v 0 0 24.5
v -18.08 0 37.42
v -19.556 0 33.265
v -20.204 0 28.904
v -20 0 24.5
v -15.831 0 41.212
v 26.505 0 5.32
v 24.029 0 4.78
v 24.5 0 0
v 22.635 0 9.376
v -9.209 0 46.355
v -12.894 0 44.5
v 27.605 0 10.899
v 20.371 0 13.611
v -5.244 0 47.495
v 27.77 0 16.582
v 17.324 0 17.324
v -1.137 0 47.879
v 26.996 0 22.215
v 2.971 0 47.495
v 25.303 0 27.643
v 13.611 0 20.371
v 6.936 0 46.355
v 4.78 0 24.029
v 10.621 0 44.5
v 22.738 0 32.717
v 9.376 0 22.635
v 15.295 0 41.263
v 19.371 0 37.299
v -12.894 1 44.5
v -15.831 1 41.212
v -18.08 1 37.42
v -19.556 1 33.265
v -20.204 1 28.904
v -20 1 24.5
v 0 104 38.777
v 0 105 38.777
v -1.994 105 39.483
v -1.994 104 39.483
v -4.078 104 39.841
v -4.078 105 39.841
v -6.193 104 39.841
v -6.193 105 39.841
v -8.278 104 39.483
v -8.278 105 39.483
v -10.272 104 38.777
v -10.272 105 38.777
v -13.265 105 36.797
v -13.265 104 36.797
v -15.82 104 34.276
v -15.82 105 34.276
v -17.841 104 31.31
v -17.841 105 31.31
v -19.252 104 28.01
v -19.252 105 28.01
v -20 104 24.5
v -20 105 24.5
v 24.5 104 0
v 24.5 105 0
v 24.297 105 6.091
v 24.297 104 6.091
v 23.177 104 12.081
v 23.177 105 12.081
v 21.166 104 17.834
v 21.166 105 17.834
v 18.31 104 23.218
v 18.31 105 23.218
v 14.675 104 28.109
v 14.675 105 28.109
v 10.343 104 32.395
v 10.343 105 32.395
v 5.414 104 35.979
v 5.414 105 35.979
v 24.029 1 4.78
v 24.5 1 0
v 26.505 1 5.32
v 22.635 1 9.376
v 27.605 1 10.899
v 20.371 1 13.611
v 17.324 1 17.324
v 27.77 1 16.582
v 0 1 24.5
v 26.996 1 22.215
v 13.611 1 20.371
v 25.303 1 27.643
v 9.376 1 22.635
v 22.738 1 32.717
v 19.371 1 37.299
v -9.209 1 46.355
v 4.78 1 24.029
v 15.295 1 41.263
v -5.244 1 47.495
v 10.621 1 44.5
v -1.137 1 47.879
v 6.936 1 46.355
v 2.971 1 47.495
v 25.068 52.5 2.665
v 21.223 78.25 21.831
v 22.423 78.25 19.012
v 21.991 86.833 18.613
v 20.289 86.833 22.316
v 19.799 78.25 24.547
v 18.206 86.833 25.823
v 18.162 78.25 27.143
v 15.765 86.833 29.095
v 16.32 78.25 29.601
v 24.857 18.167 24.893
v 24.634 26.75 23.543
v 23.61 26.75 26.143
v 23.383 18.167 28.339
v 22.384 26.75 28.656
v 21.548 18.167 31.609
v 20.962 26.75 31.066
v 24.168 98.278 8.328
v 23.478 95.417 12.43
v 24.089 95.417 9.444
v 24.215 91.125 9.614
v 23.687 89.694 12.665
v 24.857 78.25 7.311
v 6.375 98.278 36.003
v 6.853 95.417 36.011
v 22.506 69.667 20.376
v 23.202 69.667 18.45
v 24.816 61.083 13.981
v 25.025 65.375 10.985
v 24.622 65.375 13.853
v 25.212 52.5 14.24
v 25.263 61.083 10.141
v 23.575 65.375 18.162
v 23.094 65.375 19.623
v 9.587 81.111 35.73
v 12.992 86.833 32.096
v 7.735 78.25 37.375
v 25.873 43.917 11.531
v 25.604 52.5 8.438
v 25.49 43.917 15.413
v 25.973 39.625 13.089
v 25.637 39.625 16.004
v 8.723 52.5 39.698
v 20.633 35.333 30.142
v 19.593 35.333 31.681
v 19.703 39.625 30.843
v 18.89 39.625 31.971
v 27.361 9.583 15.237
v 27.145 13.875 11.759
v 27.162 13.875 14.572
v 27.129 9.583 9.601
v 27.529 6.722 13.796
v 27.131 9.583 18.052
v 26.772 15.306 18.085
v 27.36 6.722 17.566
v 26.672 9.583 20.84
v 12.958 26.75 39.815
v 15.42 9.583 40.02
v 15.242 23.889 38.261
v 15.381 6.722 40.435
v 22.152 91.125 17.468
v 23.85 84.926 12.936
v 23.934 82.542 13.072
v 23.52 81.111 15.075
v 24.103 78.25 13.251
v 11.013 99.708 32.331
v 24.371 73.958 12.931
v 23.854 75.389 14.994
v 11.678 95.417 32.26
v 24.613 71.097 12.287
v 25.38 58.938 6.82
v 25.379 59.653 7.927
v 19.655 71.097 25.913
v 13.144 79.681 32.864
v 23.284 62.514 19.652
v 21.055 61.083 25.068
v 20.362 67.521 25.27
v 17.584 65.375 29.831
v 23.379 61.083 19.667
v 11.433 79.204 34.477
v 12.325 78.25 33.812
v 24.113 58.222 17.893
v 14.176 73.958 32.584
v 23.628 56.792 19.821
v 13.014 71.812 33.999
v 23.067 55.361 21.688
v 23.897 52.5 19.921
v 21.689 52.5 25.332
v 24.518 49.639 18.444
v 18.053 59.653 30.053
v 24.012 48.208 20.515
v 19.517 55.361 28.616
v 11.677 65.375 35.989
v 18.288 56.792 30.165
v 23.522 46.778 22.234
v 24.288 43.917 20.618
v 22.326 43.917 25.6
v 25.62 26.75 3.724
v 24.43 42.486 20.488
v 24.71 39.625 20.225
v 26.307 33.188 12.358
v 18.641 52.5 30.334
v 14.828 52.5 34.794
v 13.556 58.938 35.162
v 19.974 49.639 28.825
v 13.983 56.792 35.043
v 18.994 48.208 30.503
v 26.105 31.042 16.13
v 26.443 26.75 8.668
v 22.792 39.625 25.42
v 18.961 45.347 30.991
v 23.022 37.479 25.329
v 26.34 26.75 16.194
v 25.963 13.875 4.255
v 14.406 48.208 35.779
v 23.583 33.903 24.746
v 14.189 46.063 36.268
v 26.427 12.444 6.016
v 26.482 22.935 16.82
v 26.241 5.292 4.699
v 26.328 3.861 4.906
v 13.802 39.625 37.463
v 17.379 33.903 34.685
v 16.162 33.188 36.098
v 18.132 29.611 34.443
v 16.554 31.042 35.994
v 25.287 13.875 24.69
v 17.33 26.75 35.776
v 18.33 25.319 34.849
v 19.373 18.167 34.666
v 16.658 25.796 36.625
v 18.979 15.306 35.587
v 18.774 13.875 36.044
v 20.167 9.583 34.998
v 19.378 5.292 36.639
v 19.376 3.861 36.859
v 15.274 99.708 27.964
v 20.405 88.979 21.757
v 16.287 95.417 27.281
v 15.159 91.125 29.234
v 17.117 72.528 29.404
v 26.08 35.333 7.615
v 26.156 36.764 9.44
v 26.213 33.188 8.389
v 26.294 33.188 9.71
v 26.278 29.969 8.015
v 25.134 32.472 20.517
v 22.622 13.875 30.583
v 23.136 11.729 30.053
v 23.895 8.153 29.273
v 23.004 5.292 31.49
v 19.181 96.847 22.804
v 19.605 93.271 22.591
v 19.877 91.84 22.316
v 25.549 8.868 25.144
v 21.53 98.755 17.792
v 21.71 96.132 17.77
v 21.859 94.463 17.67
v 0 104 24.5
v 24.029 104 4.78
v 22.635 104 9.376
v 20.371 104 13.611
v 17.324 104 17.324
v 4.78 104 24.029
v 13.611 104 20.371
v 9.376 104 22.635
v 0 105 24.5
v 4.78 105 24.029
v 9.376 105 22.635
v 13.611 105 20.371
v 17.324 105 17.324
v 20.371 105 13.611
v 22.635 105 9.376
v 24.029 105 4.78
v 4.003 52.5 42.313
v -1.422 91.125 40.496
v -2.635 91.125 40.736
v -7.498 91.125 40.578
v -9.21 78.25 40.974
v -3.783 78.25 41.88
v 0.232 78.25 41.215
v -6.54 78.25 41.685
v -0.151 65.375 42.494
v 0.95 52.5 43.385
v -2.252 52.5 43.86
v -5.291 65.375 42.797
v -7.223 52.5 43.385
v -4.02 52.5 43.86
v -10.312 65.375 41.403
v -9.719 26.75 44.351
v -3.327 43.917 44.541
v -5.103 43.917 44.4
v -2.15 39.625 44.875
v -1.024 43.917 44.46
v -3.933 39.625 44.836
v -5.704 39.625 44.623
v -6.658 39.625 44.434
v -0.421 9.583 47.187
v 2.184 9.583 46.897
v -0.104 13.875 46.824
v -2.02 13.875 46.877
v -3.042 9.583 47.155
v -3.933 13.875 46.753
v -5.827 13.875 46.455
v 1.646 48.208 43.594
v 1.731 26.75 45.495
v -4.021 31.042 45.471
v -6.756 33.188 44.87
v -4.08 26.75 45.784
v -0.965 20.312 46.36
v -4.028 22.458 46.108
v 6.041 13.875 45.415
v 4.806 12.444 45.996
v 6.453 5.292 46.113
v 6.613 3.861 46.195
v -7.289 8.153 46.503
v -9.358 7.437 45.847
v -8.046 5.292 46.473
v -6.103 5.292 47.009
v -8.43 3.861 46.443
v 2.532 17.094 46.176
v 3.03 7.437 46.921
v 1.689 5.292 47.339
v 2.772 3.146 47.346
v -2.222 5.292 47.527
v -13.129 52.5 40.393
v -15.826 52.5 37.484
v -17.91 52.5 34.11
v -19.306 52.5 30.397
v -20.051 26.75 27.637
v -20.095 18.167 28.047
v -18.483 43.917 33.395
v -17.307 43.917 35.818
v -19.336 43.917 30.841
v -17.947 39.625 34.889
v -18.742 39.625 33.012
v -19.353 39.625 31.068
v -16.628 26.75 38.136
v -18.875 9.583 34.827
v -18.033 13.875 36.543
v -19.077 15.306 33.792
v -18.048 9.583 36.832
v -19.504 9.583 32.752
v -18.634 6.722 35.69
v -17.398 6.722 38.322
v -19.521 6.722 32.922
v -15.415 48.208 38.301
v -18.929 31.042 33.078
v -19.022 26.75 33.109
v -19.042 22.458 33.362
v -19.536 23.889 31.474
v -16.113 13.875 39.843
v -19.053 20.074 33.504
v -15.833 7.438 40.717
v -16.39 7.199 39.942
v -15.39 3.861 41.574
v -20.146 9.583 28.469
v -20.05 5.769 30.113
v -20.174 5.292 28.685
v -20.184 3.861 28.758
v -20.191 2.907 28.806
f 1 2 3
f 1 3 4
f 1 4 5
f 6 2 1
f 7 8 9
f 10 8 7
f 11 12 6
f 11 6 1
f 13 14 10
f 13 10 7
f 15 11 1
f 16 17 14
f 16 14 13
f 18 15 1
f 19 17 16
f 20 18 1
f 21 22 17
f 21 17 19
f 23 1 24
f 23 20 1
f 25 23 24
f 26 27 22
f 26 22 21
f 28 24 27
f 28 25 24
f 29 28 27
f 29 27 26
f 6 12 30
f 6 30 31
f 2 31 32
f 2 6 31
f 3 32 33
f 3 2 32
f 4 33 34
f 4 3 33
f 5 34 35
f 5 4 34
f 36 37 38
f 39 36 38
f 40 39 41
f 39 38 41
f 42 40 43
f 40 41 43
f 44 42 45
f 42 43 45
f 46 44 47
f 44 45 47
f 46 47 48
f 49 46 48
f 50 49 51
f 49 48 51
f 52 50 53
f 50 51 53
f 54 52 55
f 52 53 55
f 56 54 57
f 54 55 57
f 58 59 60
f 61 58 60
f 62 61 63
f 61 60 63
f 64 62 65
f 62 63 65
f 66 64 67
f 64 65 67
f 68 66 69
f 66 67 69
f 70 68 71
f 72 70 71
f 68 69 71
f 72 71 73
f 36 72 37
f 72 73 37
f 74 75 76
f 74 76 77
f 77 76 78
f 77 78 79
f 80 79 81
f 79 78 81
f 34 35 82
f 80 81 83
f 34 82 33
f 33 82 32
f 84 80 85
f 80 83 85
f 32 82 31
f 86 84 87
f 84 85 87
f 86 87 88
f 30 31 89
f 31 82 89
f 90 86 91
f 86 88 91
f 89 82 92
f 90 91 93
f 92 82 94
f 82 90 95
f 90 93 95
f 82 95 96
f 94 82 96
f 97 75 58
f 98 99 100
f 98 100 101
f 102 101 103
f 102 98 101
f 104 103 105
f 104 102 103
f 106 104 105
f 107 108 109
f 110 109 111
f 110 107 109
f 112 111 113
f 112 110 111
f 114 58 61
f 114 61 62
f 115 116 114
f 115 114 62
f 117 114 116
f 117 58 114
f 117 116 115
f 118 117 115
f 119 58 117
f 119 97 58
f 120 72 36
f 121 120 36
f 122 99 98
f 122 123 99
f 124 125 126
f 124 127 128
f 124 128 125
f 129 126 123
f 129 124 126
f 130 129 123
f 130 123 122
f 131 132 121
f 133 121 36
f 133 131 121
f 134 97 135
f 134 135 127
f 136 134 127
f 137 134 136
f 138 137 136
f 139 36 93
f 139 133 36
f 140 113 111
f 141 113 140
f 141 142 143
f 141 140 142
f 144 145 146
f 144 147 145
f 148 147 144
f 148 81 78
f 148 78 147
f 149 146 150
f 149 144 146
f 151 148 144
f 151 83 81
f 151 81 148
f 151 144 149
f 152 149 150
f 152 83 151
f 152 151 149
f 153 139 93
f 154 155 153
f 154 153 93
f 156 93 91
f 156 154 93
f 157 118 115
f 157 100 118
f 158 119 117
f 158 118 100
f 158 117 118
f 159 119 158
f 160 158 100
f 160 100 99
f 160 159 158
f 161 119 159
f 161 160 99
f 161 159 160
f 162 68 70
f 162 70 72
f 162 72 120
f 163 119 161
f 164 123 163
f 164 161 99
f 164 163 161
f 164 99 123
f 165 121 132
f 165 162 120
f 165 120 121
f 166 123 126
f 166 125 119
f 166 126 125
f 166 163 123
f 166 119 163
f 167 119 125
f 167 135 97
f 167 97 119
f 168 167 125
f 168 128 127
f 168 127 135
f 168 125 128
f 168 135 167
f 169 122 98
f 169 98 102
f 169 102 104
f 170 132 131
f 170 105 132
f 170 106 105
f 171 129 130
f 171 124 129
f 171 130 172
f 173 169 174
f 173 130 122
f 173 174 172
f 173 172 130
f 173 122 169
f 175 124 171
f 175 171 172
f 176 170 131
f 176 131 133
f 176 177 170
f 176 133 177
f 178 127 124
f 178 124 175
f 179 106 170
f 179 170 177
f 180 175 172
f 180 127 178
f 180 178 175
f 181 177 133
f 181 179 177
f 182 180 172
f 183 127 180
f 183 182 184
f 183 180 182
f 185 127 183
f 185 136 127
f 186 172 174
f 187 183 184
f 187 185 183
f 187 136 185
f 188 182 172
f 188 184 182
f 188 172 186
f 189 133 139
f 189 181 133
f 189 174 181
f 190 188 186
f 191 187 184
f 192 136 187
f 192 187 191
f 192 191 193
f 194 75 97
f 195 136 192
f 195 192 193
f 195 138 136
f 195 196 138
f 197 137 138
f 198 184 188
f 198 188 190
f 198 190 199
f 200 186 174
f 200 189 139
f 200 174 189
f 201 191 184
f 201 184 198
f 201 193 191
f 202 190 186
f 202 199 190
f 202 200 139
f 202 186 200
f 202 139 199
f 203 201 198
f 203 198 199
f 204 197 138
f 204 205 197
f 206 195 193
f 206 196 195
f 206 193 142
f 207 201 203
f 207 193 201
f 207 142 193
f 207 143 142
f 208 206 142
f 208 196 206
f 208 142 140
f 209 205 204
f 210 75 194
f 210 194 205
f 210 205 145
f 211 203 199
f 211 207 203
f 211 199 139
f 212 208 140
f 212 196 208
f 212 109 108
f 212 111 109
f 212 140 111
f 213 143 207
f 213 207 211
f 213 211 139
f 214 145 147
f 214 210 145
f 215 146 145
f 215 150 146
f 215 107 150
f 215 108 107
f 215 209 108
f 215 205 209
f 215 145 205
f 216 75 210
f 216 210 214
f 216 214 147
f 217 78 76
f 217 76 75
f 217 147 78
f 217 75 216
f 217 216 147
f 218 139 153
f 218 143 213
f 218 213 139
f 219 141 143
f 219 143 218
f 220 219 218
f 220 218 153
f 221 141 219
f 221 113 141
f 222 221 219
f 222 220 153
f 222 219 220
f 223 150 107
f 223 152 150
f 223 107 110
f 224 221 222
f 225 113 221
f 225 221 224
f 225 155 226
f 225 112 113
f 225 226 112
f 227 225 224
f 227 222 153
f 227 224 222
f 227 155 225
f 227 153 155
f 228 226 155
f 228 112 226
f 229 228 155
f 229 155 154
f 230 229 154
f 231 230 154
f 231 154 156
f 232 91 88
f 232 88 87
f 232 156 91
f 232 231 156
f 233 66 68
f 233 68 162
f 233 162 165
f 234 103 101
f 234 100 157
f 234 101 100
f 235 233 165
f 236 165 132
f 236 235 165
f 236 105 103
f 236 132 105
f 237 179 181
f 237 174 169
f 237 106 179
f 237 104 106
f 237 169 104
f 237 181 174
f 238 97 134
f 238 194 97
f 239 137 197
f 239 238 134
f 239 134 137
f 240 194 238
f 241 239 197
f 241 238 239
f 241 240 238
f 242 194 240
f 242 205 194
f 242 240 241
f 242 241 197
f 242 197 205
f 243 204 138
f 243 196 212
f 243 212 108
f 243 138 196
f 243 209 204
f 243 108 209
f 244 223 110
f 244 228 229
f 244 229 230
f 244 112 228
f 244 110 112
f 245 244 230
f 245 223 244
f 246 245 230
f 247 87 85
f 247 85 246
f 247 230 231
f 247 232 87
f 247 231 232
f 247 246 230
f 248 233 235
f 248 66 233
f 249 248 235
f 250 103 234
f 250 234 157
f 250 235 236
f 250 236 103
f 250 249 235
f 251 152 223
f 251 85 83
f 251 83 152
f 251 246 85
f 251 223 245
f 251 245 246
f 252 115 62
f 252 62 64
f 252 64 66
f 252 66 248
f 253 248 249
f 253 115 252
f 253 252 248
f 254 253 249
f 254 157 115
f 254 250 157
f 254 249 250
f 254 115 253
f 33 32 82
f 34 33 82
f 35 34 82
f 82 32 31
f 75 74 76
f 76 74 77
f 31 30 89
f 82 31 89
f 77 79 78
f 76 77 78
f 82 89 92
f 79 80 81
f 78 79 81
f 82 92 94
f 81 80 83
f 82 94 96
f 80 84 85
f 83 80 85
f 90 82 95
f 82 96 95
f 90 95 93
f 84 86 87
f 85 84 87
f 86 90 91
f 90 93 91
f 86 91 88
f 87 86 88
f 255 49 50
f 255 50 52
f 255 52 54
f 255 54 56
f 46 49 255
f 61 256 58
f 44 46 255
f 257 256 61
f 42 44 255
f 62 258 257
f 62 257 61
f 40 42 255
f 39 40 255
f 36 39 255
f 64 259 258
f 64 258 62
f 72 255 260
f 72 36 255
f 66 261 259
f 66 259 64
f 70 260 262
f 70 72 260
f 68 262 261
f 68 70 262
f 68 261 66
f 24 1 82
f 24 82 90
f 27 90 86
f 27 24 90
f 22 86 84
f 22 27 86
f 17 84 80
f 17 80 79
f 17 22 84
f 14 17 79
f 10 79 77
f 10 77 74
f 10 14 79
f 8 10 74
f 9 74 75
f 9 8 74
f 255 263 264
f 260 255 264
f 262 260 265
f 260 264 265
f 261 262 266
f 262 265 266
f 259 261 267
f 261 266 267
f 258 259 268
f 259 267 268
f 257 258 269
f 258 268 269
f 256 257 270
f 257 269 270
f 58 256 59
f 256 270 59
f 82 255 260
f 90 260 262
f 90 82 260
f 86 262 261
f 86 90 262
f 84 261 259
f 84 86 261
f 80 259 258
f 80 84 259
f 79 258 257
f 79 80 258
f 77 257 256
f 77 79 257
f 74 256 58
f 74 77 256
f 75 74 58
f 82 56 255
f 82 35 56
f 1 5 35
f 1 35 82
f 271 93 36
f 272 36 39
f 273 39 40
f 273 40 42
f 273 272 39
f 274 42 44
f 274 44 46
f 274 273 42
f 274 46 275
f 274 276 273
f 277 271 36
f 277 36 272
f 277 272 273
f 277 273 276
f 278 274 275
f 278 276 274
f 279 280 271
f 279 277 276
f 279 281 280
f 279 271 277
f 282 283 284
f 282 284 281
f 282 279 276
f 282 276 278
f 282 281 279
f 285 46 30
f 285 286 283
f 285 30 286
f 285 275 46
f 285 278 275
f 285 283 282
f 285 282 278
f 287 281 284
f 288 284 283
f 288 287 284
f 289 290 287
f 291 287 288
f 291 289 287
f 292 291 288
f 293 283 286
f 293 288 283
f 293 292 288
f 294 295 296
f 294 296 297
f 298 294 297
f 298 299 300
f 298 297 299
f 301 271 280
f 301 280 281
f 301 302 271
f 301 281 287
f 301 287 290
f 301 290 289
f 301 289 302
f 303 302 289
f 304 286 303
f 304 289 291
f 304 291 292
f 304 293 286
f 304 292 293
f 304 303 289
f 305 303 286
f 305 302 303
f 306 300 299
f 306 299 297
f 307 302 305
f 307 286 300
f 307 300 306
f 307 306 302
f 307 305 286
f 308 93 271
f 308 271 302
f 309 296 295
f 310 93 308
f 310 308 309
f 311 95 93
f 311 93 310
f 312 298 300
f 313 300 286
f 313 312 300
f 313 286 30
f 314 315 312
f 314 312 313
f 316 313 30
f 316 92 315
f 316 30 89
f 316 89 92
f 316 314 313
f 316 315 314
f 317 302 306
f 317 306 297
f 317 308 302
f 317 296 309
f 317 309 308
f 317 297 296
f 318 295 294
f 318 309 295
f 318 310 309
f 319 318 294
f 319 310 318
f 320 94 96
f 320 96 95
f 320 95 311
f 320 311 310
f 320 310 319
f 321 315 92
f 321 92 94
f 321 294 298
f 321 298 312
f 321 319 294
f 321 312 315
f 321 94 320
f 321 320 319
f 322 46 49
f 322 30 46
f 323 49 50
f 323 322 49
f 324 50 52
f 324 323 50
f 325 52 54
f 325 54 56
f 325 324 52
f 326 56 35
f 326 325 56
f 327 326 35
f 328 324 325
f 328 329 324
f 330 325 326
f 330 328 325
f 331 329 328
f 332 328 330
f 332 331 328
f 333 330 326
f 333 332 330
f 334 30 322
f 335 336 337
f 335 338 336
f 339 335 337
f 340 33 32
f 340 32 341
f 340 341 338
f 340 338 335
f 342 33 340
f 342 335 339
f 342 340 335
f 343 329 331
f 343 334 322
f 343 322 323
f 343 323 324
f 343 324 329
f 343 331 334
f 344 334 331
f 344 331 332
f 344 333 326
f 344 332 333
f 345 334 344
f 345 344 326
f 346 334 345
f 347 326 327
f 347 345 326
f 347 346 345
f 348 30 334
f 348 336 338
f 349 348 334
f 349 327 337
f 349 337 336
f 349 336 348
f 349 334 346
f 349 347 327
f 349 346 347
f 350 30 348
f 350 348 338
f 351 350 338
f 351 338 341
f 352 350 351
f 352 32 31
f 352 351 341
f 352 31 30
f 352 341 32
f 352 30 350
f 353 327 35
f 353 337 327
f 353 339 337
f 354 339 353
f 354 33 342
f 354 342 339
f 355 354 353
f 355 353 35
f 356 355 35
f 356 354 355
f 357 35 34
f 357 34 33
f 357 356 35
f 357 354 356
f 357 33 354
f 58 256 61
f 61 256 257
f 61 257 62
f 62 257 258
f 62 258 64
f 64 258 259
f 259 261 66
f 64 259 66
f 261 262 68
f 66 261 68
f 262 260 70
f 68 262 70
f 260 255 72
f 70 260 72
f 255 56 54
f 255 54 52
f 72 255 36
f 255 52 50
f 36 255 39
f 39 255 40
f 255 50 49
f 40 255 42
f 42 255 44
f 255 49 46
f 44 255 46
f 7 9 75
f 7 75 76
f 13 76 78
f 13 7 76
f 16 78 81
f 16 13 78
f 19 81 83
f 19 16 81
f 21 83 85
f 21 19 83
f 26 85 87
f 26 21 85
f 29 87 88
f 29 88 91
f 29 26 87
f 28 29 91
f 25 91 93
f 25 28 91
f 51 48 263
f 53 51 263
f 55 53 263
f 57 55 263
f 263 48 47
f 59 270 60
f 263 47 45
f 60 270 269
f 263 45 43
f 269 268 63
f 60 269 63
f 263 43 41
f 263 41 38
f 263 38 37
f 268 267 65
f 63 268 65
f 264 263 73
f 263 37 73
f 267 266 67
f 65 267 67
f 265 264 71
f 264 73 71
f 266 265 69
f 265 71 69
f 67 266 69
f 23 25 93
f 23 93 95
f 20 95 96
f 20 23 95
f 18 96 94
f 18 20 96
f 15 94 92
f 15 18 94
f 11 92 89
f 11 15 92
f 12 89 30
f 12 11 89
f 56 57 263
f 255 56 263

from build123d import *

# Parameters (mm, degrees)
F3_DEPTH = 1
F4_DEPTH = 1


with BuildPart() as f3:
    # F0 (on Front) → F3 (new body)
    with BuildSketch(Plane.XZ):
        with BuildLine():
            ThreePointArc((0, 24.5), (17.324116, 17.324116), (24.5, 0))
            ThreePointArc((24.5, 0), (26.262022, 24.963942), (10.620872, 44.5))
            ThreePointArc((10.620872, 44.5), (-1.136736, 47.879267), (-12.894344, 44.5))
            ThreePointArc((-12.894344, 44.5), (-18.918747, 35.378108), (-20, 24.5))
            Line((-20, 24.5), (-12.894344, 24.5))
            Line((-12.894344, 24.5), (0, 24.5))
        make_face()
    extrude(amount=-F3_DEPTH)


with BuildPart() as f4:
    # F2 (on offset) → F4 (new body)
    with BuildSketch(Plane.XZ.offset(-105)):
        with BuildLine():
            Line((-20, 24.5), (0, 24.5))
            ThreePointArc((0, 24.5), (17.324116, 17.324116), (24.5, 0))
            ThreePointArc((24.5, 0), (18.310327, 23.217635), (0, 38.777281))
            ThreePointArc((0, 38.777281), (-5.135931, 39.886059), (-10.271862, 38.777281))
            ThreePointArc((-10.271862, 38.777281), (-16.902065, 32.842034), (-20, 24.5))
        make_face()
    extrude(amount=F4_DEPTH)


with BuildPart() as f5:
    # F4_face (on face) → F5 section 0
    with BuildSketch(Plane(origin=(0.282722, 104, 28.774045), x_dir=(1, 0, 0), z_dir=(0, -1, 0))):
        with BuildLine():
            ThreePointArc((-0.282722, 10.003236), (-5.418653, 11.112015), (-10.554584, 10.003236))
            ThreePointArc((-10.554584, 10.003236), (-17.184787, 4.06799), (-20.282722, -4.274045))
            Line((-20.282722, -4.274045), (-0.282722, -4.274045))
            ThreePointArc((-0.282722, -4.274045), (17.041394, -11.449929), (24.217278, -28.774045))
            ThreePointArc((24.217278, -28.774045), (18.027605, -5.55641), (-0.282722, 10.003236))
        make_face()
    # F3_face (on face) → F5 section 1
    with BuildSketch(Plane(origin=(4.895741, 1, 31.20711), x_dir=(1, 0, 0), z_dir=(0, 1, 0))):
        with BuildLine():
            ThreePointArc((19.604259, 31.20711), (12.428376, 13.882994), (-4.895741, 6.70711))
            Line((-4.895741, 6.70711), (-24.895741, 6.70711))
            ThreePointArc((-24.895741, 6.70711), (-23.814488, -4.170998), (-17.790084, -13.29289))
            ThreePointArc((-17.790084, -13.29289), (-6.032476, -16.672156), (5.725132, -13.29289))
            ThreePointArc((5.725132, -13.29289), (21.366281, 6.243168), (19.604259, 31.20711))
        make_face()
    loft()


solid = Compound([f3.part, f4.part, f5.part])
